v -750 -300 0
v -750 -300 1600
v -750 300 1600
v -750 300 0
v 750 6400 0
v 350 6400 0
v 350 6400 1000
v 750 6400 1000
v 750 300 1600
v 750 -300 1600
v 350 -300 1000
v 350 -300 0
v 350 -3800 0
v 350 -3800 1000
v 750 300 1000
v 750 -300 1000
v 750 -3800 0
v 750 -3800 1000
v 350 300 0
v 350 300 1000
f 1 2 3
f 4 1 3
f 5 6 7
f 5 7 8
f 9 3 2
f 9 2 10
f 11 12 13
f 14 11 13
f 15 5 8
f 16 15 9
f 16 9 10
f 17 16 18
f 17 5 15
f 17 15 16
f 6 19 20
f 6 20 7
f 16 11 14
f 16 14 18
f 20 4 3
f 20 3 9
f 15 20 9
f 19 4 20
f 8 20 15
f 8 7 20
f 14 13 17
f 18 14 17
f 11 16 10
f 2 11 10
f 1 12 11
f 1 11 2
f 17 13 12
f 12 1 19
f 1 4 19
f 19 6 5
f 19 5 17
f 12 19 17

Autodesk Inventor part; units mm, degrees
ref_plane "YZ Plane" through (0, 0, 0) normal (1, 0, 0) x (0, 1, 0)
ref_plane "XZ Plane" through (0, 0, 0) normal (0, 1, 0) x (-1, 0, 0)
ref_plane "XY Plane" through (0, 0, 0) normal (0, 0, 1) x (1, 0, 0)
sketch "Sketch1" plane through (0, 0, 0) normal (0, 0, 1) x (1, 0, 0)
  line L0 (-750, 300) -> (750, 300)
  line L1 (750, 300) -> (750, -300)
  line L2 (750, -300) -> (-750, -300)
  line L3 (-750, -300) -> (-750, 300)
  line L4 (-750, 300) -> (750, -300) construction
  line L5 (750, 300) -> (-750, -300) construction
  point P0 (0, 0)
  dimension "d0" = 1500
  dimension "d1" = 600
extrude "Extrusion1" add sketch "Sketch1" along normal blind 1600
sketch "Sketch2" plane through (0, 0, 0) normal (0, 0, 1) x (1, 0, 0)
  line L0 (-750, -300) -> (750, -300) projected
  line L1 (750, -300) -> (750, 300) projected
  line L2 (750, 300) -> (-750, 300) projected
  line L3 (-750, 300) -> (-750, -300) projected
  line L4 (750, 300) -> (350, 300)
  line L5 (350, 300) -> (350, 6400)
  line L6 (350, 6400) -> (750, 6400)
  line L7 (750, 6400) -> (750, 300)
  line L8 (-750, -300) -> (750, -300) projected
  line L9 (750, -300) -> (350, -300)
  line L10 (350, -300) -> (350, -3800)
  line L11 (350, -3800) -> (750, -3800)
  line L12 (750, -3800) -> (750, -300)
  point P0 (0, 0)
  dimension "d4" = 400
  dimension "d5" = 6100
  dimension "d6" = 3500
extrude "Extrusion2" add sketch "Sketch2" along normal blind 1000 contours L0 L12 L11 L10 | L5 L6 L7 L2
